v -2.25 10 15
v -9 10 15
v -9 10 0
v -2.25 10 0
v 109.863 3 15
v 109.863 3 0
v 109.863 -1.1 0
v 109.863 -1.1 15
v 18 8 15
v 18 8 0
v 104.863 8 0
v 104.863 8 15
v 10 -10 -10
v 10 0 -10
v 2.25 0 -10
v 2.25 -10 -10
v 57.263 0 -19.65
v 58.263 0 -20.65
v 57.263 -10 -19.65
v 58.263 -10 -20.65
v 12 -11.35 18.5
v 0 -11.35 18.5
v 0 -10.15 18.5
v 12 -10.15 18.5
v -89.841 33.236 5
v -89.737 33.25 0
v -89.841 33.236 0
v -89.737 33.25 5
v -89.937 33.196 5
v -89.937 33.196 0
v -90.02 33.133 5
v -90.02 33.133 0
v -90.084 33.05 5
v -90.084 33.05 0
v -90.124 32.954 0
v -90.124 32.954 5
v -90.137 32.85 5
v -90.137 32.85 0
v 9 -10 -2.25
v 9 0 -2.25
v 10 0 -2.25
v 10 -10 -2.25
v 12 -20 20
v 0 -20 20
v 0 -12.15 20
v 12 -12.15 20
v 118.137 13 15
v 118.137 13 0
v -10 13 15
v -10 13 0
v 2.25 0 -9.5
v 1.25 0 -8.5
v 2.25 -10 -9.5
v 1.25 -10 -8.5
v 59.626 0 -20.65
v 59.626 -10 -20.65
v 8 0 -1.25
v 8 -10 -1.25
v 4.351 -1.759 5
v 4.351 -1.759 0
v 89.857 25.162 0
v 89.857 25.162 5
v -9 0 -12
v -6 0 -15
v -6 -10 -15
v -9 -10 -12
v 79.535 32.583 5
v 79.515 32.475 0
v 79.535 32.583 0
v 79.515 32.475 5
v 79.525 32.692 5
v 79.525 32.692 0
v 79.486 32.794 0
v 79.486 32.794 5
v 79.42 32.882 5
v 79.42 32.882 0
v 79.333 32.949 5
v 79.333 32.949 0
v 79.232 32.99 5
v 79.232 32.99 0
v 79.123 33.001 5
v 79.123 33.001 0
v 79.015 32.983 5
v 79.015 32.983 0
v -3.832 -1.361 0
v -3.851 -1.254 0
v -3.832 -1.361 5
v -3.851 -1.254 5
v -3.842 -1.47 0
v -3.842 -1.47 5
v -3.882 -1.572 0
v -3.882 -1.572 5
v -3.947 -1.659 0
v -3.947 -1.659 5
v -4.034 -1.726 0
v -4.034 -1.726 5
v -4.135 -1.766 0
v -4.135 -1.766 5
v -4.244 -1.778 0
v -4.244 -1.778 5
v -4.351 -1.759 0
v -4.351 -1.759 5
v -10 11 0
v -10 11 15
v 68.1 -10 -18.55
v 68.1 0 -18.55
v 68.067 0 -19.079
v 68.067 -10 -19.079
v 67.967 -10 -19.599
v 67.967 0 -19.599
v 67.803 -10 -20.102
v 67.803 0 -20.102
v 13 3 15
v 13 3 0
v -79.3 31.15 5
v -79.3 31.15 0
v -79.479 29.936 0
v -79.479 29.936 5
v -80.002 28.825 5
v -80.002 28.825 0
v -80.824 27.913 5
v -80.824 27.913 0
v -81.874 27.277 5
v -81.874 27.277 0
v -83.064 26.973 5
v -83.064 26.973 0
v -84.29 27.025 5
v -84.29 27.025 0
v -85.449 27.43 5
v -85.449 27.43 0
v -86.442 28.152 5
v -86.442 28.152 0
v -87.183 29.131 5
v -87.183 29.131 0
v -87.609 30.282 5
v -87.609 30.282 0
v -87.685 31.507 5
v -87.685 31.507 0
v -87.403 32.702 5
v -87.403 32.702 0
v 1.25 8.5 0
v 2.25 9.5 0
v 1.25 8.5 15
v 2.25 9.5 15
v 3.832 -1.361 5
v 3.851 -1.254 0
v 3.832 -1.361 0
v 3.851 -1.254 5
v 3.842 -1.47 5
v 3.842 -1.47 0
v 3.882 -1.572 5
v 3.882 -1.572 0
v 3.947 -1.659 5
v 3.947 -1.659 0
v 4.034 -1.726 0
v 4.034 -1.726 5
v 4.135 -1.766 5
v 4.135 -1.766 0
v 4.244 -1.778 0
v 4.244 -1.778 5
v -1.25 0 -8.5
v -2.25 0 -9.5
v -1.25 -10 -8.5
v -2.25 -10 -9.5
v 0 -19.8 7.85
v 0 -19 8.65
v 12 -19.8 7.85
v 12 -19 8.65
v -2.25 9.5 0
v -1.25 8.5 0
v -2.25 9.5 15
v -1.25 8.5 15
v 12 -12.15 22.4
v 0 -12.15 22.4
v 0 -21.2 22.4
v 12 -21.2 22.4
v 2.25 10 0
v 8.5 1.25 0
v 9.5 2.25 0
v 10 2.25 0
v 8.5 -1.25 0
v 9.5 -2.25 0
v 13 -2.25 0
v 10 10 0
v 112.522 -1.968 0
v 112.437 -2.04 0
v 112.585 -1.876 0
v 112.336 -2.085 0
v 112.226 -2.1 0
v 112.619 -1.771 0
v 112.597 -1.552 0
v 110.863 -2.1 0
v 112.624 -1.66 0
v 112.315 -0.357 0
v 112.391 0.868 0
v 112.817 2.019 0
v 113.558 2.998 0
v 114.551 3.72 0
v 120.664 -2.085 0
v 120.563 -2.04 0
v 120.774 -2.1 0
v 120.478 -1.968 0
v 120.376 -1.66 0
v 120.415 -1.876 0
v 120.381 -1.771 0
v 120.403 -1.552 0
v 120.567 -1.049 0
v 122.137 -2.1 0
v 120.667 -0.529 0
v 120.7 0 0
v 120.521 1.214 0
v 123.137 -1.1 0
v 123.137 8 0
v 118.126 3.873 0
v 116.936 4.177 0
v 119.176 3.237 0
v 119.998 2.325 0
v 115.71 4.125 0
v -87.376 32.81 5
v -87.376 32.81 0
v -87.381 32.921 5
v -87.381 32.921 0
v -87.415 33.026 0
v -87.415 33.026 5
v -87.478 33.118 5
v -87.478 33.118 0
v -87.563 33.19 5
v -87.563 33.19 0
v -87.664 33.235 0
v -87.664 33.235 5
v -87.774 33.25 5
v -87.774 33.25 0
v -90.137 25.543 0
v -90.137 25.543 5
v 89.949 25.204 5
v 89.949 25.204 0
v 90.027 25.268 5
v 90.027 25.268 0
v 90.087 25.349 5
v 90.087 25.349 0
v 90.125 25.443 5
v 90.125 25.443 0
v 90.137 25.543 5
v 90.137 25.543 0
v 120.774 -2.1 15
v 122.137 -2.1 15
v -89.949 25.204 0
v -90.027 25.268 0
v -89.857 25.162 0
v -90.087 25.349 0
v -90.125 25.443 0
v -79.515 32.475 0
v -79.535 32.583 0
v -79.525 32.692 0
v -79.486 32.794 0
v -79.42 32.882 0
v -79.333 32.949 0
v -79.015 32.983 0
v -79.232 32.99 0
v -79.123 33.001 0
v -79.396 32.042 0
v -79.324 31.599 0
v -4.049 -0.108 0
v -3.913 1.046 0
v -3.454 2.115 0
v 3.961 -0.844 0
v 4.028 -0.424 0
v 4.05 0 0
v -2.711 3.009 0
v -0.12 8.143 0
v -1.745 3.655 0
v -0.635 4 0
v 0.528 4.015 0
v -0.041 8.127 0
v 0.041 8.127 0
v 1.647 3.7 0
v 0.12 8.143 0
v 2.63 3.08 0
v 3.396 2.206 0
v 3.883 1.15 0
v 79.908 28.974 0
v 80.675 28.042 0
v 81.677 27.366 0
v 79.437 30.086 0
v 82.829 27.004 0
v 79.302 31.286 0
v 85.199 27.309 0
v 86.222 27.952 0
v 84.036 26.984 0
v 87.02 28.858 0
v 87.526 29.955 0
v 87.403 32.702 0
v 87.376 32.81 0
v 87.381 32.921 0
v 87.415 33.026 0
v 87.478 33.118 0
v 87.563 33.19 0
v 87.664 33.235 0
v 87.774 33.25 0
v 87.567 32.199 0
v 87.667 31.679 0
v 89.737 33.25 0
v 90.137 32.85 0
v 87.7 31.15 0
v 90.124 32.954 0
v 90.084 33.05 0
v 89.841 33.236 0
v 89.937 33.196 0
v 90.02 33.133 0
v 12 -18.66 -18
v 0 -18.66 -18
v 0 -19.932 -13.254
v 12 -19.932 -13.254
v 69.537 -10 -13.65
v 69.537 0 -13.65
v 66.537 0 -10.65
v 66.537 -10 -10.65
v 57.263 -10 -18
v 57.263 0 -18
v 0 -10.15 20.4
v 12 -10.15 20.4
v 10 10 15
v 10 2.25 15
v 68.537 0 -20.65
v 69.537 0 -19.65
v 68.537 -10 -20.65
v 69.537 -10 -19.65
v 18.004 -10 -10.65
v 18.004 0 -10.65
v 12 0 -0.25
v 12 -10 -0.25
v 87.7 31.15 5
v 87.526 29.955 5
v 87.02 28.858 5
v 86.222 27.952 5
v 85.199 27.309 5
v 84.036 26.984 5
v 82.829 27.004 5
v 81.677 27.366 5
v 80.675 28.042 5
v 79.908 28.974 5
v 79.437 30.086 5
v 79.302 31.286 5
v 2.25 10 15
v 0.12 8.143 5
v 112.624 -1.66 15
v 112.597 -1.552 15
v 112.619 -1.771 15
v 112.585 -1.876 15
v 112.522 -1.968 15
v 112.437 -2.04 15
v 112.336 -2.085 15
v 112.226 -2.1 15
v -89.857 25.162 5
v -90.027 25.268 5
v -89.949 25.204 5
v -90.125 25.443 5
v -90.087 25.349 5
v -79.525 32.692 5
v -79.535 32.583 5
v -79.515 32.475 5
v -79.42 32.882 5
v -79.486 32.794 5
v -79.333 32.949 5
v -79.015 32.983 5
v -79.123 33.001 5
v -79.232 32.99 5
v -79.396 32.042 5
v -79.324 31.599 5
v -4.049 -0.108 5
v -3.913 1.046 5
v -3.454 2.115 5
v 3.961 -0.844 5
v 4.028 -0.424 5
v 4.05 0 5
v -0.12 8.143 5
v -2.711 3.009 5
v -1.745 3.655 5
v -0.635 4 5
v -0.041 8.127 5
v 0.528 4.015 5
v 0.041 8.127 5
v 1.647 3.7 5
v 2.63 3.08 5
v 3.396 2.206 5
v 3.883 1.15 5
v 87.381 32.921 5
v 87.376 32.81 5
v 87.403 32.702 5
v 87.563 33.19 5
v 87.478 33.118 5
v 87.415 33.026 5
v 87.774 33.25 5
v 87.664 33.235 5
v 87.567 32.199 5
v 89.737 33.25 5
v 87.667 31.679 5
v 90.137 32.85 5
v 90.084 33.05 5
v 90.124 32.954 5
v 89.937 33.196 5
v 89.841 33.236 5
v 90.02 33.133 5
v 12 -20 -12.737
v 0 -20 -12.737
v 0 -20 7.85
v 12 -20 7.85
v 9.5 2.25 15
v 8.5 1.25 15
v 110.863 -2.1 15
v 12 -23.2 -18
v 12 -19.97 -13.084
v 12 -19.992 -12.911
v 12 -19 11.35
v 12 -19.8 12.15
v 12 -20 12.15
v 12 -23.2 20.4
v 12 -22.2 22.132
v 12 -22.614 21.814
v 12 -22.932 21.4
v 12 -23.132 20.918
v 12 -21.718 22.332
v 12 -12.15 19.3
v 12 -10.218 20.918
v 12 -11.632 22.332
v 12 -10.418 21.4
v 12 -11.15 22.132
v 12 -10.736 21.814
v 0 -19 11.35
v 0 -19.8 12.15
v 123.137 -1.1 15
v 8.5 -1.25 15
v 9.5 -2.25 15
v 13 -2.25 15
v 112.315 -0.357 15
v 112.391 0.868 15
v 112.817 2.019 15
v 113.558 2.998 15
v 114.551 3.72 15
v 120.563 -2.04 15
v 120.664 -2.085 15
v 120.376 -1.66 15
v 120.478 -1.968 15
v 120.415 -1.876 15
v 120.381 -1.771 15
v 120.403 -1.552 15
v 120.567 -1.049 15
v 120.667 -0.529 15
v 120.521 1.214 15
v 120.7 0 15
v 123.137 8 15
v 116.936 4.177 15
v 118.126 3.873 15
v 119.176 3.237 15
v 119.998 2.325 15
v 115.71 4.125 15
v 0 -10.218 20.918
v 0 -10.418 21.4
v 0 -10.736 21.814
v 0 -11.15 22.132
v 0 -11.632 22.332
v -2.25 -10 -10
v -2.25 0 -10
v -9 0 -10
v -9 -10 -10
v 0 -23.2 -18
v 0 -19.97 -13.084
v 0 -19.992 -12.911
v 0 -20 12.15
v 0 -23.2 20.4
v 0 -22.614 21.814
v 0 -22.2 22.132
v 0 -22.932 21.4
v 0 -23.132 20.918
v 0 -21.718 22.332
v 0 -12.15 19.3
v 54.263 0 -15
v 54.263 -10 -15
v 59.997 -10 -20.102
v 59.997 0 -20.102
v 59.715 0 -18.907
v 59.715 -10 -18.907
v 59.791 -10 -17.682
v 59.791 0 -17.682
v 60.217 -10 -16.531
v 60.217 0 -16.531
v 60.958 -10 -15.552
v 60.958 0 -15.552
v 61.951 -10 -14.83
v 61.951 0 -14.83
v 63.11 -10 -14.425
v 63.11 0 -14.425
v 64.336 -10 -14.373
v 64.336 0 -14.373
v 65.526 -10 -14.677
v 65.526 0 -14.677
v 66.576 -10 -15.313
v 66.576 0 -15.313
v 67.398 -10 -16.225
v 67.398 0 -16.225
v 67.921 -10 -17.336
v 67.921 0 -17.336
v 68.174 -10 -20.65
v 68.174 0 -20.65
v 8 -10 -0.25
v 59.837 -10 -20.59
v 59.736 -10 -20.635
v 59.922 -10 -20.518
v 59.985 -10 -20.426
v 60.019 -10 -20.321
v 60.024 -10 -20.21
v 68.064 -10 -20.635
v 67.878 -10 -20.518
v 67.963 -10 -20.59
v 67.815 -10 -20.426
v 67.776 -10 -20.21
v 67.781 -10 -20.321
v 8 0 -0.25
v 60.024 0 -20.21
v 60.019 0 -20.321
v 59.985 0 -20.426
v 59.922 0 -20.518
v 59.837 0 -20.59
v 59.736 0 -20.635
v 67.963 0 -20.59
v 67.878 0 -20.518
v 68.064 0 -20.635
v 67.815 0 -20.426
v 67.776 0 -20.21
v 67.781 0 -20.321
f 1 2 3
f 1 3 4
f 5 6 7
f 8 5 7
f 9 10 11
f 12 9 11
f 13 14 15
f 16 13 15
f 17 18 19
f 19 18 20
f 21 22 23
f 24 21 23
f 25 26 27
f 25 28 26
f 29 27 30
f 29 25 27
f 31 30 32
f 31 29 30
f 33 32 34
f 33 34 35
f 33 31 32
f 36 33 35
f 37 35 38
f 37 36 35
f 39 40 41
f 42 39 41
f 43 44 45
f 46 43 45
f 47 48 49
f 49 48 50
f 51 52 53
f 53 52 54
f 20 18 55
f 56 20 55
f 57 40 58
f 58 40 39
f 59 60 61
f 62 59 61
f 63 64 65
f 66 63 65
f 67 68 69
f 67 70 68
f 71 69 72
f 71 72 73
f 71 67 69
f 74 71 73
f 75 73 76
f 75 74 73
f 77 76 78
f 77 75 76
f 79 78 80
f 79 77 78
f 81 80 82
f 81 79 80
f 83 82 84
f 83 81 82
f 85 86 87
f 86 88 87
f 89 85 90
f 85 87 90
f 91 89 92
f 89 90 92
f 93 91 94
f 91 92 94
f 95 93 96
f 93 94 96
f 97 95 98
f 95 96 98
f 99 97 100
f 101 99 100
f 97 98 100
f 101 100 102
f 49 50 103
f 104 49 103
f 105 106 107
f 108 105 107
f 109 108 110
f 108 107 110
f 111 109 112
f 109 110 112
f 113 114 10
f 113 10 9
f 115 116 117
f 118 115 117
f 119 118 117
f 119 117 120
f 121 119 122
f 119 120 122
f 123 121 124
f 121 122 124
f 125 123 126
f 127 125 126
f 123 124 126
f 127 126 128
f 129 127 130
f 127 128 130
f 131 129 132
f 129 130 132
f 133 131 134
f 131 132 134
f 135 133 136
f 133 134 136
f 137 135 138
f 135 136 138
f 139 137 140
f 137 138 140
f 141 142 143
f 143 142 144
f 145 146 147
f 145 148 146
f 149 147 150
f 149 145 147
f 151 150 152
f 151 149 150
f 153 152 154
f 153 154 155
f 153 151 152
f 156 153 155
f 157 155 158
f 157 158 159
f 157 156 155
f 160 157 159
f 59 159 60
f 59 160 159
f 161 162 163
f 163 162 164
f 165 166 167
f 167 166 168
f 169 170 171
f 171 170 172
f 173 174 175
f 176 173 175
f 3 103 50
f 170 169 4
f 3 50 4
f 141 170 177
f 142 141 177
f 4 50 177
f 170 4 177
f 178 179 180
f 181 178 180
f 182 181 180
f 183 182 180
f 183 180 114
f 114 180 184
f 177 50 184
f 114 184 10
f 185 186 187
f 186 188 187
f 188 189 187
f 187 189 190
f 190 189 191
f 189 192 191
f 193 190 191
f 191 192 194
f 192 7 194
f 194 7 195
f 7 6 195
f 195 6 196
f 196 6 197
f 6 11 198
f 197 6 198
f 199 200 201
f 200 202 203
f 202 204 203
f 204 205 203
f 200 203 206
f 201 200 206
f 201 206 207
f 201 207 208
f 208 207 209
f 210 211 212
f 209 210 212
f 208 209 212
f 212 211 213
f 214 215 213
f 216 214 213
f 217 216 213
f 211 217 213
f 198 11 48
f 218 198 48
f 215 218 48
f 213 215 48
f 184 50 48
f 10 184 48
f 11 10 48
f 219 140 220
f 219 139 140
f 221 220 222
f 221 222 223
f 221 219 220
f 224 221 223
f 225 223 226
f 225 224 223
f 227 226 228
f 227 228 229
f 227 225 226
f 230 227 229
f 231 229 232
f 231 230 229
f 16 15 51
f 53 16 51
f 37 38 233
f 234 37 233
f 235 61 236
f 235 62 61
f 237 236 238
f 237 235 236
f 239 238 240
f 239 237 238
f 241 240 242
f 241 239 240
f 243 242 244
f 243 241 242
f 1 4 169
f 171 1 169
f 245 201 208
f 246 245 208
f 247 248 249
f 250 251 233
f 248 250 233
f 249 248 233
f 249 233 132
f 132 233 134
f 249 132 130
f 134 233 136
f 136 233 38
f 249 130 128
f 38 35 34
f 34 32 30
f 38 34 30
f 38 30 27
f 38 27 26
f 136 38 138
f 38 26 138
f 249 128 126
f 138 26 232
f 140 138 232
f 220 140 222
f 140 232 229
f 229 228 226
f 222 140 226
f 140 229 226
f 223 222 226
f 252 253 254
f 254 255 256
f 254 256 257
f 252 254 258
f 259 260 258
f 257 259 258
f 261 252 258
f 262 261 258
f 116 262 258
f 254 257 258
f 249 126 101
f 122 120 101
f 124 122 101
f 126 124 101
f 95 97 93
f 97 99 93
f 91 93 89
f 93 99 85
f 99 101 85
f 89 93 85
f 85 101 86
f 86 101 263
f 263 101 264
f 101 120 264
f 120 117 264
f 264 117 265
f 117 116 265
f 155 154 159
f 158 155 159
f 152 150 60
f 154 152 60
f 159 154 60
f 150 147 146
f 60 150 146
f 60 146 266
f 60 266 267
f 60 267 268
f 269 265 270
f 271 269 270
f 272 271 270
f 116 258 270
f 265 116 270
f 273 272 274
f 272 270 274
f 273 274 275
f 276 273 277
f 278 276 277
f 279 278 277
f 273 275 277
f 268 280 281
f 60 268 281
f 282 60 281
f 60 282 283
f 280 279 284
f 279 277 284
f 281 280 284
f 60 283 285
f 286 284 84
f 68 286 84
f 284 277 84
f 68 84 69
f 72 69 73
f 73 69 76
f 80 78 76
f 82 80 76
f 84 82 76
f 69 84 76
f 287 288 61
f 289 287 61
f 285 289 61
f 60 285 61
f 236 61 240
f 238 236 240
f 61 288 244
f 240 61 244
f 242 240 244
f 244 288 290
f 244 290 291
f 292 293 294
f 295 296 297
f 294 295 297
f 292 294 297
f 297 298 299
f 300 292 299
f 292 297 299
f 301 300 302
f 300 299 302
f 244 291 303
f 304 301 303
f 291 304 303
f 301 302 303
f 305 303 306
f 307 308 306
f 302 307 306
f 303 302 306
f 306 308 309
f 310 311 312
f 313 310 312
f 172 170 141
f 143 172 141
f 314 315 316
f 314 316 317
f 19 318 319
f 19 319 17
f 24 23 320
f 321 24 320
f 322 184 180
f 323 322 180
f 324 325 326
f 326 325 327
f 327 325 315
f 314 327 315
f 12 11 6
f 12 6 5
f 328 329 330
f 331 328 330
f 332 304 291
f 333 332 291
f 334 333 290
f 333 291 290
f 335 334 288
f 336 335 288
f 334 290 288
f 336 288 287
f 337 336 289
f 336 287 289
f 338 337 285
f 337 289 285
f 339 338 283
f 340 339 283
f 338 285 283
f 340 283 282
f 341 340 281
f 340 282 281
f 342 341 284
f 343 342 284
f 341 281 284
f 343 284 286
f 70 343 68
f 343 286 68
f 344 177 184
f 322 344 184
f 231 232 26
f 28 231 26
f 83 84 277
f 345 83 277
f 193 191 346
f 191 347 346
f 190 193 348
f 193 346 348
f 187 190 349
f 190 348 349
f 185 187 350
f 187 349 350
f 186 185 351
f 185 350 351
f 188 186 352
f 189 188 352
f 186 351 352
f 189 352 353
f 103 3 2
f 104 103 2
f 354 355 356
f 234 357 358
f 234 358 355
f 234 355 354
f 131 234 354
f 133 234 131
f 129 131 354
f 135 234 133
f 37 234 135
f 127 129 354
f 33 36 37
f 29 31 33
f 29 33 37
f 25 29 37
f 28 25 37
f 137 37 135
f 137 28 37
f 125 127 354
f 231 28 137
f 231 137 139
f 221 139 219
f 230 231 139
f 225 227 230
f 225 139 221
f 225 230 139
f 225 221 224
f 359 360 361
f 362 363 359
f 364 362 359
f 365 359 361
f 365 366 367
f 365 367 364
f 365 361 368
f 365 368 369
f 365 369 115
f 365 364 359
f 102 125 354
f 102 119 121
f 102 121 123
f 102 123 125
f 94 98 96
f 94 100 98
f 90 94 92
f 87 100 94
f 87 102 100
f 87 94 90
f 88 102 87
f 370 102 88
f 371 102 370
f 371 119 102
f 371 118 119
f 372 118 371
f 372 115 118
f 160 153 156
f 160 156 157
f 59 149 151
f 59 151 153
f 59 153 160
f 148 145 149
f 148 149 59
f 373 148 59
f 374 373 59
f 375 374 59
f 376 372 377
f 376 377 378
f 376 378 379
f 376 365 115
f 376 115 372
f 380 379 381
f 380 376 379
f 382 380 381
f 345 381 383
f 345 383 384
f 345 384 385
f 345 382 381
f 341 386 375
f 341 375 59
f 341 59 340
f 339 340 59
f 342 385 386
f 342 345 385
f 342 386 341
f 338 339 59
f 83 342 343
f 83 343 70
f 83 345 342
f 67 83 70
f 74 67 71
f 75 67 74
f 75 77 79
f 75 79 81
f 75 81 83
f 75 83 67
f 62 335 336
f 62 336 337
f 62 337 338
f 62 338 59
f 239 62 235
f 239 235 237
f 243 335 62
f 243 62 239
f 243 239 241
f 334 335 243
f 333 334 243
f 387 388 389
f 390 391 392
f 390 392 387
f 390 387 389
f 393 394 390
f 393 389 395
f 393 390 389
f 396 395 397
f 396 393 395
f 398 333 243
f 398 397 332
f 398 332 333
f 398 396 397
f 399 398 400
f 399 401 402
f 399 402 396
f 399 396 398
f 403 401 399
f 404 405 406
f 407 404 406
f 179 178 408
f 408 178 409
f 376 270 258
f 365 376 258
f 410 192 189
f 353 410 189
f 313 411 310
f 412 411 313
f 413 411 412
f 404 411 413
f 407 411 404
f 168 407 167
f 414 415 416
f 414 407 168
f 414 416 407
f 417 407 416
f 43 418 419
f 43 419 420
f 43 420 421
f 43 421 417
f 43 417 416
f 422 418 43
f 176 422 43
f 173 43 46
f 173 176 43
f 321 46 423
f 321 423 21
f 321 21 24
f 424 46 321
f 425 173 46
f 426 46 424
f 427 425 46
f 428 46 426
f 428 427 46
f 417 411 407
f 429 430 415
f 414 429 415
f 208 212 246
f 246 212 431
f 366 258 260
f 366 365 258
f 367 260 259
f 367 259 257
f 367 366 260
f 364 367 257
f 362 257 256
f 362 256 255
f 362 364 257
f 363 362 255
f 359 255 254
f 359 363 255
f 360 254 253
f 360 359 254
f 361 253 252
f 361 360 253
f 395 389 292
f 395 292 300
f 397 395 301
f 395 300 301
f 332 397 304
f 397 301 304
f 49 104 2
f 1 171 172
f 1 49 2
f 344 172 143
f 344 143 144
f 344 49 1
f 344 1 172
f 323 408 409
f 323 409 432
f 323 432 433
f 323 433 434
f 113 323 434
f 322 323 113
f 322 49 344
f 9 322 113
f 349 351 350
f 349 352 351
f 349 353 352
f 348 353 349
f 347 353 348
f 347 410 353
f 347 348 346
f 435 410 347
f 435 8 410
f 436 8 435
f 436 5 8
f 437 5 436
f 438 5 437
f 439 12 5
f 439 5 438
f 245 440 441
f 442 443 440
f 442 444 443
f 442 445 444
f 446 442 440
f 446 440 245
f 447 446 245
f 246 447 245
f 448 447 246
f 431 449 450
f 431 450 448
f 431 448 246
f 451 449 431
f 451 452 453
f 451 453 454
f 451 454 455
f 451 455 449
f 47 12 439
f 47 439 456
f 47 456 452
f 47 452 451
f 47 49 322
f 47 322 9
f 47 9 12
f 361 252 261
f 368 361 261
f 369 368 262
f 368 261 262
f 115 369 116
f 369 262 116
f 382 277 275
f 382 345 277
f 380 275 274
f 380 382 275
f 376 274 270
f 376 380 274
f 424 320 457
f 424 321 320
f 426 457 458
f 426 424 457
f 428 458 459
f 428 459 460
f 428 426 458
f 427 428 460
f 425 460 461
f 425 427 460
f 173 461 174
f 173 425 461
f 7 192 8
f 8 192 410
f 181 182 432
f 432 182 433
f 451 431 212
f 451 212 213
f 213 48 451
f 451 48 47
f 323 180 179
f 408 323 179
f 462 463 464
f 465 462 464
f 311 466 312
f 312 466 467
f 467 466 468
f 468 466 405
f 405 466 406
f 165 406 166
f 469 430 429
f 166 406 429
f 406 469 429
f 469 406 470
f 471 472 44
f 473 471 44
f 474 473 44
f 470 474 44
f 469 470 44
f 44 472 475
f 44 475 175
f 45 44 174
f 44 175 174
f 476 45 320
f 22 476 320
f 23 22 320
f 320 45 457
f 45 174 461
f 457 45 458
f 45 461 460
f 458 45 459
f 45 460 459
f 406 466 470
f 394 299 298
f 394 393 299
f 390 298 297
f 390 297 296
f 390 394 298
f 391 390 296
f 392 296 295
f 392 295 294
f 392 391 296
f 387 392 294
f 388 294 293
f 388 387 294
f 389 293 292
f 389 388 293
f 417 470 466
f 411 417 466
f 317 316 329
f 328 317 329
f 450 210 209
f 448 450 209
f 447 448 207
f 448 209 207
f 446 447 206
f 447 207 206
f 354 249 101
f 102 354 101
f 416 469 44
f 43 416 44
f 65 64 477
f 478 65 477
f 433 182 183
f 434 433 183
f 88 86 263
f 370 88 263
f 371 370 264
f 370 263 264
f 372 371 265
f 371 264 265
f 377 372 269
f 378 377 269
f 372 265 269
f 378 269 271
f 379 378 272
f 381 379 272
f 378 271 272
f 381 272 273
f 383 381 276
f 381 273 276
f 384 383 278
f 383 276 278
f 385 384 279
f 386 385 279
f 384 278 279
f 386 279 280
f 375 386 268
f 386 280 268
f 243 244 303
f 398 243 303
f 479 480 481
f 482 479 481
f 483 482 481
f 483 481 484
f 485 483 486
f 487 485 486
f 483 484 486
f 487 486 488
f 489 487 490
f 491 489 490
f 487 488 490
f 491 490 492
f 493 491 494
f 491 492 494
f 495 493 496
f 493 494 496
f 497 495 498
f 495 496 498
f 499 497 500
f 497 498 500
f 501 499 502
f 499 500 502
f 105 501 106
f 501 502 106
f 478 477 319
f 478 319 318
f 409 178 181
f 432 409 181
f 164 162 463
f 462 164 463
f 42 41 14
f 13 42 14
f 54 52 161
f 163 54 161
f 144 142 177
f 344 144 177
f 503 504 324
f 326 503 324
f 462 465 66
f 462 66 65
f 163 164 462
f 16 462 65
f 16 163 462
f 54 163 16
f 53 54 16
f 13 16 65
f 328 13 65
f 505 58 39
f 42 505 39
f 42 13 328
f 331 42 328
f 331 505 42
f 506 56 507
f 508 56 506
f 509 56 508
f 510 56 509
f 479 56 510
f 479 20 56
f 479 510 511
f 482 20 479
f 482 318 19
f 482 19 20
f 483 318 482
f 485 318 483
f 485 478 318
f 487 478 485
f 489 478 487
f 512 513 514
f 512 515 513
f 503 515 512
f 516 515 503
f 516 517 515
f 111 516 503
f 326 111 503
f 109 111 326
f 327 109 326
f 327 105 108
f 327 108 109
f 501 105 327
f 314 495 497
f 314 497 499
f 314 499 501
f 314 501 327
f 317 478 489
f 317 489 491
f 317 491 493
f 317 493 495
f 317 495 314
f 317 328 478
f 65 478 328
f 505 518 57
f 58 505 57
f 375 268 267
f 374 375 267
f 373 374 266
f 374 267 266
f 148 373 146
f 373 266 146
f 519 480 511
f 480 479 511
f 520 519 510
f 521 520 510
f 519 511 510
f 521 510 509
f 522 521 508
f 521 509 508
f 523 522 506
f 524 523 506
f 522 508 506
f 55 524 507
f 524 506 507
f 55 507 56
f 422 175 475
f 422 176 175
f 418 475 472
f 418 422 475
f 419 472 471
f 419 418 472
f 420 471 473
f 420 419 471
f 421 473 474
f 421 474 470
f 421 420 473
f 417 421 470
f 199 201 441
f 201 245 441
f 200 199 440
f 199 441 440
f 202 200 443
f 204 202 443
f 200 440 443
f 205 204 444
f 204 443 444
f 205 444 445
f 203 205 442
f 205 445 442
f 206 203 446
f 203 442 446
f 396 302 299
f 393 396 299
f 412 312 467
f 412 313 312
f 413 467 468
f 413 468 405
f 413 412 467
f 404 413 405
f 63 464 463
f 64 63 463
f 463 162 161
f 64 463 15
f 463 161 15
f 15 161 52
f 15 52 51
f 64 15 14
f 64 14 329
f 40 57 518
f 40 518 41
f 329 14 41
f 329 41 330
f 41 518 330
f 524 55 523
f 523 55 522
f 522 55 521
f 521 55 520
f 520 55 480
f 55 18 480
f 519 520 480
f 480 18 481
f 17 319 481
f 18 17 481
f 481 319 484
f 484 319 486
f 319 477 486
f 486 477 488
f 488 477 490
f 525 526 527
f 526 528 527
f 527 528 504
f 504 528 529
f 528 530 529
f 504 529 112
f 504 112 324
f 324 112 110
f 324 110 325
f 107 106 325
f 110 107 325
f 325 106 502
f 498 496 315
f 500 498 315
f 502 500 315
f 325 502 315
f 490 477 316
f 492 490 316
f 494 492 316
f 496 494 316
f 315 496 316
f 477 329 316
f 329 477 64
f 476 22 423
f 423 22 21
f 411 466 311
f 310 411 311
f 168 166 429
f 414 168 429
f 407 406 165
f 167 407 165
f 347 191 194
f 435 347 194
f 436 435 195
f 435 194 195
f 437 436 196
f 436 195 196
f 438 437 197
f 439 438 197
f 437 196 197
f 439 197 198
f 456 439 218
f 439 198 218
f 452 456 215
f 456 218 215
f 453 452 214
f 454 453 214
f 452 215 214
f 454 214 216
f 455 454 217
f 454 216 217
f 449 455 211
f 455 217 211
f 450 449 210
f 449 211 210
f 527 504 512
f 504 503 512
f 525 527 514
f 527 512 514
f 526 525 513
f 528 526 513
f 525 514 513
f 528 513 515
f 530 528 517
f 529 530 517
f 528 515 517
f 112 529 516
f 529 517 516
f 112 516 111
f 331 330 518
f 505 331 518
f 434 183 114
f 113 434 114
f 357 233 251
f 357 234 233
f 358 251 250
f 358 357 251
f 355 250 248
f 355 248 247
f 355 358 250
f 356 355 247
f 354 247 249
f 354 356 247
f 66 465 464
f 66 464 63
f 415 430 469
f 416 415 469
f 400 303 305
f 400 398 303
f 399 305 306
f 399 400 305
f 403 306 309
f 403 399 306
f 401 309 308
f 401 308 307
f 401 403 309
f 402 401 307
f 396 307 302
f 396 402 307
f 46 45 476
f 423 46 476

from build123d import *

# Parameters (mm, degrees)
F2_DEPTH  = 10
F3_SIZE   = 1
F4_SIZE   = 3
F6_DEPTH  = 15
F7_SIZE   = 1
F8_SIZE   = 5
F9_R      = 0.4
F9_2_R    = 0.4
F15_DEPTH = 5
F16_R     = 0.4
F12_DEPTH = 12
F13_SIZE  = 0.8
F14_R     = 2


with BuildPart() as f2:
    # F1 (on Front) → F2 (new body)
    with BuildSketch(Plane.XZ):
        with BuildLine():
            Line((8, -0.25), (8, -2.25))
            Line((8, -2.25), (10, -2.25))
            Line((10, -2.25), (10, -10))
            Line((10, -10), (2.25, -10))
            Line((2.25, -10), (2.25, -8.5))
            Line((2.25, -8.5), (-2.25, -8.5))
            Line((-2.25, -8.5), (-2.25, -10))
            Line((-2.25, -10), (-9, -10))
            Line((-9, -10), (-9, -15))
            Line((-9, -15), (57.262693, -15))
            Line((57.262693, -15), (57.262693, -20.65))
            Line((57.262693, -20.65), (60.262693, -20.65))
            ThreePointArc((60.262693, -20.65), (62.81296, -14.493112), (68.1, -18.55))
            ThreePointArc((68.1, -18.55), (67.956888, -19.63704), (67.537307, -20.65))
            Line((67.537307, -20.65), (69.537307, -20.65))
            Line((69.537307, -20.65), (69.537307, -10.65))
            Line((69.537307, -10.65), (18.004443, -10.65))
            Line((18.004443, -10.65), (12, -0.25))
            Line((12, -0.25), (8, -0.25))
        make_face()
    extrude(amount=F2_DEPTH)

    # F3
    f3_edges = [f2.edges().sort_by_distance(p)[0] for p in [
        (-2.25, -5, -8.5),
        (2.25, -5, -8.5),
        (8, -5, -2.25),
        (57.262693, -5, -20.65),
        (69.537307, -5, -20.65),
    ]]
    chamfer(f3_edges, length=F3_SIZE)

    # F4
    f4_edges = [f2.edges().sort_by_distance(p)[0] for p in [
        (-9, -5, -15),
        (57.262693, -5, -15),
        (69.537307, -5, -10.65),
    ]]
    chamfer(f4_edges, length=F4_SIZE)

    # F9
    f9_edges = [f2.edges().sort_by_distance(p)[0] for p in [
        (60.262693, -5, -20.65),
        (67.537307, -5, -20.65),
    ]]
    fillet(f9_edges, radius=F9_R)


with BuildPart() as f6:
    # F5 (on Top) → F6 (new body)
    with BuildSketch(Plane.XY):
        with BuildLine():
            ThreePointArc((112.862693, -2.1), (115.41296, 4.056888), (120.7, 0))
            ThreePointArc((120.7, 0), (120.556888, -1.08704), (120.137307, -2.1))
            Line((120.137307, -2.1), (123.137307, -2.1))
            Line((123.137307, -2.1), (123.137307, 13))
            Line((123.137307, 13), (-10, 13))
            Line((-10, 13), (-10, 10))
            Line((-10, 10), (-2.25, 10))
            Line((-2.25, 10), (-2.25, 8.5))
            Line((-2.25, 8.5), (2.25, 8.5))
            Line((2.25, 8.5), (2.25, 10))
            Line((2.25, 10), (10, 10))
            Line((10, 10), (10, 2.25))
            Line((10, 2.25), (8.5, 2.25))
            Line((8.5, 2.25), (8.5, -2.25))
            Line((8.5, -2.25), (10, -2.25))
            Line((10, -2.25), (13, -2.25))
            Line((13, -2.25), (13, 8))
            Line((13, 8), (109.862693, 8))
            Line((109.862693, 8), (109.862693, -2.1))
            Line((109.862693, -2.1), (112.862693, -2.1))
        make_face()
    extrude(amount=F6_DEPTH)

    # F7
    f7_edges = [f6.edges().sort_by_distance(p)[0] for p in [
        (8.5, 2.25, 7.5),
        (8.5, -2.25, 7.5),
        (-2.25, 8.5, 7.5),
        (2.25, 8.5, 7.5),
        (-10, 10, 7.5),
        (109.862693, -2.1, 7.5),
        (123.137307, -2.1, 7.5),
    ]]
    chamfer(f7_edges, length=F7_SIZE)

    # F8
    f8_edges = [f6.edges().sort_by_distance(p)[0] for p in [
        (123.137307, 13, 7.5),
        (109.862693, 8, 7.5),
        (13, 8, 7.5),
    ]]
    chamfer(f8_edges, length=F8_SIZE)

    # F9#2
    f9_2_edges = [f6.edges().sort_by_distance(p)[0] for p in [
        (112.862693, -2.1, 7.5),
        (120.137307, -2.1, 7.5),
    ]]
    fillet(f9_2_edges, radius=F9_2_R)


with BuildPart() as f15:
    # F10 (on Top) → F15 (new body)
    with BuildSketch(Plane.XY):
        with BuildLine():
            ThreePointArc((-3.507403, -2.025), (-1.048217, 3.912), (4.05, 0))
            ThreePointArc((4.05, 0), (3.912, -1.048217), (3.507403, -2.025))
            Line((3.507403, -2.025), (90.137307, 25.25))
            Line((90.137307, 25.25), (90.137307, 33.25))
            Line((90.137307, 33.25), (87.137307, 33.25))
            ThreePointArc((87.137307, 33.25), (87.556888, 32.23704), (87.7, 31.15))
            ThreePointArc((87.7, 31.15), (82.41296, 27.093112), (79.862693, 33.25))
            Line((79.862693, 33.25), (0, 8.105623))
            Line((0, 8.105623), (-79.862693, 33.25))
            ThreePointArc((-79.862693, 33.25), (-79.443112, 32.23704), (-79.3, 31.15))
            ThreePointArc((-79.3, 31.15), (-84.58704, 27.093112), (-87.137307, 33.25))
            Line((-87.137307, 33.25), (-90.137307, 33.25))
            Line((-90.137307, 33.25), (-90.137307, 25.25))
            Line((-90.137307, 25.25), (-3.507403, -2.025))
        make_face()
    extrude(amount=F15_DEPTH)

    # F16
    f16_edges = [f15.edges().sort_by_distance(p)[0] for p in [
        (-3.507403, -2.025, 2.5),
        (3.507403, -2.025, 2.5),
        (0, 8.105623, 2.5),
        (79.862693, 33.25, 2.5),
        (87.137307, 33.25, 2.5),
        (90.137307, 33.25, 2.5),
        (90.137307, 25.25, 2.5),
        (-90.137307, 33.25, 2.5),
        (-90.137307, 25.25, 2.5),
        (-79.862693, 33.25, 2.5),
        (-87.137307, 33.25, 2.5),
    ]]
    fillet(f16_edges, radius=F16_R)


with BuildPart() as f12:
    # F11 (on Right) → F12 (new body)
    with BuildSketch(Plane.YZ):
        Polygon((-12.15, 20), (-12.15, 18.5), (-10.15, 18.5), (-10.15, 22.4), (-23.2, 22.4), (-23.2, -18), (-18.660254, -18), (-20, -13), (-20, 7.85), (-19, 7.85), (-19, 12.15), (-20, 12.15), (-20, 20), align=None)
    extrude(amount=F12_DEPTH)

    # F13
    f13_edges = [f12.edges().sort_by_distance(p)[0] for p in [
        (6, -19, 12.15),
        (6, -12.15, 18.5),
        (6, -19, 7.85),
    ]]
    chamfer(f13_edges, length=F13_SIZE)

    # F14
    f14_edges = [f12.edges().sort_by_distance(p)[0] for p in [
        (6, -23.2, 22.4),
        (6, -20, -13),
        (6, -10.15, 22.4),
    ]]
    fillet(f14_edges, radius=F14_R)


solid = Compound([f2.part, f6.part, f15.part, f12.part])
